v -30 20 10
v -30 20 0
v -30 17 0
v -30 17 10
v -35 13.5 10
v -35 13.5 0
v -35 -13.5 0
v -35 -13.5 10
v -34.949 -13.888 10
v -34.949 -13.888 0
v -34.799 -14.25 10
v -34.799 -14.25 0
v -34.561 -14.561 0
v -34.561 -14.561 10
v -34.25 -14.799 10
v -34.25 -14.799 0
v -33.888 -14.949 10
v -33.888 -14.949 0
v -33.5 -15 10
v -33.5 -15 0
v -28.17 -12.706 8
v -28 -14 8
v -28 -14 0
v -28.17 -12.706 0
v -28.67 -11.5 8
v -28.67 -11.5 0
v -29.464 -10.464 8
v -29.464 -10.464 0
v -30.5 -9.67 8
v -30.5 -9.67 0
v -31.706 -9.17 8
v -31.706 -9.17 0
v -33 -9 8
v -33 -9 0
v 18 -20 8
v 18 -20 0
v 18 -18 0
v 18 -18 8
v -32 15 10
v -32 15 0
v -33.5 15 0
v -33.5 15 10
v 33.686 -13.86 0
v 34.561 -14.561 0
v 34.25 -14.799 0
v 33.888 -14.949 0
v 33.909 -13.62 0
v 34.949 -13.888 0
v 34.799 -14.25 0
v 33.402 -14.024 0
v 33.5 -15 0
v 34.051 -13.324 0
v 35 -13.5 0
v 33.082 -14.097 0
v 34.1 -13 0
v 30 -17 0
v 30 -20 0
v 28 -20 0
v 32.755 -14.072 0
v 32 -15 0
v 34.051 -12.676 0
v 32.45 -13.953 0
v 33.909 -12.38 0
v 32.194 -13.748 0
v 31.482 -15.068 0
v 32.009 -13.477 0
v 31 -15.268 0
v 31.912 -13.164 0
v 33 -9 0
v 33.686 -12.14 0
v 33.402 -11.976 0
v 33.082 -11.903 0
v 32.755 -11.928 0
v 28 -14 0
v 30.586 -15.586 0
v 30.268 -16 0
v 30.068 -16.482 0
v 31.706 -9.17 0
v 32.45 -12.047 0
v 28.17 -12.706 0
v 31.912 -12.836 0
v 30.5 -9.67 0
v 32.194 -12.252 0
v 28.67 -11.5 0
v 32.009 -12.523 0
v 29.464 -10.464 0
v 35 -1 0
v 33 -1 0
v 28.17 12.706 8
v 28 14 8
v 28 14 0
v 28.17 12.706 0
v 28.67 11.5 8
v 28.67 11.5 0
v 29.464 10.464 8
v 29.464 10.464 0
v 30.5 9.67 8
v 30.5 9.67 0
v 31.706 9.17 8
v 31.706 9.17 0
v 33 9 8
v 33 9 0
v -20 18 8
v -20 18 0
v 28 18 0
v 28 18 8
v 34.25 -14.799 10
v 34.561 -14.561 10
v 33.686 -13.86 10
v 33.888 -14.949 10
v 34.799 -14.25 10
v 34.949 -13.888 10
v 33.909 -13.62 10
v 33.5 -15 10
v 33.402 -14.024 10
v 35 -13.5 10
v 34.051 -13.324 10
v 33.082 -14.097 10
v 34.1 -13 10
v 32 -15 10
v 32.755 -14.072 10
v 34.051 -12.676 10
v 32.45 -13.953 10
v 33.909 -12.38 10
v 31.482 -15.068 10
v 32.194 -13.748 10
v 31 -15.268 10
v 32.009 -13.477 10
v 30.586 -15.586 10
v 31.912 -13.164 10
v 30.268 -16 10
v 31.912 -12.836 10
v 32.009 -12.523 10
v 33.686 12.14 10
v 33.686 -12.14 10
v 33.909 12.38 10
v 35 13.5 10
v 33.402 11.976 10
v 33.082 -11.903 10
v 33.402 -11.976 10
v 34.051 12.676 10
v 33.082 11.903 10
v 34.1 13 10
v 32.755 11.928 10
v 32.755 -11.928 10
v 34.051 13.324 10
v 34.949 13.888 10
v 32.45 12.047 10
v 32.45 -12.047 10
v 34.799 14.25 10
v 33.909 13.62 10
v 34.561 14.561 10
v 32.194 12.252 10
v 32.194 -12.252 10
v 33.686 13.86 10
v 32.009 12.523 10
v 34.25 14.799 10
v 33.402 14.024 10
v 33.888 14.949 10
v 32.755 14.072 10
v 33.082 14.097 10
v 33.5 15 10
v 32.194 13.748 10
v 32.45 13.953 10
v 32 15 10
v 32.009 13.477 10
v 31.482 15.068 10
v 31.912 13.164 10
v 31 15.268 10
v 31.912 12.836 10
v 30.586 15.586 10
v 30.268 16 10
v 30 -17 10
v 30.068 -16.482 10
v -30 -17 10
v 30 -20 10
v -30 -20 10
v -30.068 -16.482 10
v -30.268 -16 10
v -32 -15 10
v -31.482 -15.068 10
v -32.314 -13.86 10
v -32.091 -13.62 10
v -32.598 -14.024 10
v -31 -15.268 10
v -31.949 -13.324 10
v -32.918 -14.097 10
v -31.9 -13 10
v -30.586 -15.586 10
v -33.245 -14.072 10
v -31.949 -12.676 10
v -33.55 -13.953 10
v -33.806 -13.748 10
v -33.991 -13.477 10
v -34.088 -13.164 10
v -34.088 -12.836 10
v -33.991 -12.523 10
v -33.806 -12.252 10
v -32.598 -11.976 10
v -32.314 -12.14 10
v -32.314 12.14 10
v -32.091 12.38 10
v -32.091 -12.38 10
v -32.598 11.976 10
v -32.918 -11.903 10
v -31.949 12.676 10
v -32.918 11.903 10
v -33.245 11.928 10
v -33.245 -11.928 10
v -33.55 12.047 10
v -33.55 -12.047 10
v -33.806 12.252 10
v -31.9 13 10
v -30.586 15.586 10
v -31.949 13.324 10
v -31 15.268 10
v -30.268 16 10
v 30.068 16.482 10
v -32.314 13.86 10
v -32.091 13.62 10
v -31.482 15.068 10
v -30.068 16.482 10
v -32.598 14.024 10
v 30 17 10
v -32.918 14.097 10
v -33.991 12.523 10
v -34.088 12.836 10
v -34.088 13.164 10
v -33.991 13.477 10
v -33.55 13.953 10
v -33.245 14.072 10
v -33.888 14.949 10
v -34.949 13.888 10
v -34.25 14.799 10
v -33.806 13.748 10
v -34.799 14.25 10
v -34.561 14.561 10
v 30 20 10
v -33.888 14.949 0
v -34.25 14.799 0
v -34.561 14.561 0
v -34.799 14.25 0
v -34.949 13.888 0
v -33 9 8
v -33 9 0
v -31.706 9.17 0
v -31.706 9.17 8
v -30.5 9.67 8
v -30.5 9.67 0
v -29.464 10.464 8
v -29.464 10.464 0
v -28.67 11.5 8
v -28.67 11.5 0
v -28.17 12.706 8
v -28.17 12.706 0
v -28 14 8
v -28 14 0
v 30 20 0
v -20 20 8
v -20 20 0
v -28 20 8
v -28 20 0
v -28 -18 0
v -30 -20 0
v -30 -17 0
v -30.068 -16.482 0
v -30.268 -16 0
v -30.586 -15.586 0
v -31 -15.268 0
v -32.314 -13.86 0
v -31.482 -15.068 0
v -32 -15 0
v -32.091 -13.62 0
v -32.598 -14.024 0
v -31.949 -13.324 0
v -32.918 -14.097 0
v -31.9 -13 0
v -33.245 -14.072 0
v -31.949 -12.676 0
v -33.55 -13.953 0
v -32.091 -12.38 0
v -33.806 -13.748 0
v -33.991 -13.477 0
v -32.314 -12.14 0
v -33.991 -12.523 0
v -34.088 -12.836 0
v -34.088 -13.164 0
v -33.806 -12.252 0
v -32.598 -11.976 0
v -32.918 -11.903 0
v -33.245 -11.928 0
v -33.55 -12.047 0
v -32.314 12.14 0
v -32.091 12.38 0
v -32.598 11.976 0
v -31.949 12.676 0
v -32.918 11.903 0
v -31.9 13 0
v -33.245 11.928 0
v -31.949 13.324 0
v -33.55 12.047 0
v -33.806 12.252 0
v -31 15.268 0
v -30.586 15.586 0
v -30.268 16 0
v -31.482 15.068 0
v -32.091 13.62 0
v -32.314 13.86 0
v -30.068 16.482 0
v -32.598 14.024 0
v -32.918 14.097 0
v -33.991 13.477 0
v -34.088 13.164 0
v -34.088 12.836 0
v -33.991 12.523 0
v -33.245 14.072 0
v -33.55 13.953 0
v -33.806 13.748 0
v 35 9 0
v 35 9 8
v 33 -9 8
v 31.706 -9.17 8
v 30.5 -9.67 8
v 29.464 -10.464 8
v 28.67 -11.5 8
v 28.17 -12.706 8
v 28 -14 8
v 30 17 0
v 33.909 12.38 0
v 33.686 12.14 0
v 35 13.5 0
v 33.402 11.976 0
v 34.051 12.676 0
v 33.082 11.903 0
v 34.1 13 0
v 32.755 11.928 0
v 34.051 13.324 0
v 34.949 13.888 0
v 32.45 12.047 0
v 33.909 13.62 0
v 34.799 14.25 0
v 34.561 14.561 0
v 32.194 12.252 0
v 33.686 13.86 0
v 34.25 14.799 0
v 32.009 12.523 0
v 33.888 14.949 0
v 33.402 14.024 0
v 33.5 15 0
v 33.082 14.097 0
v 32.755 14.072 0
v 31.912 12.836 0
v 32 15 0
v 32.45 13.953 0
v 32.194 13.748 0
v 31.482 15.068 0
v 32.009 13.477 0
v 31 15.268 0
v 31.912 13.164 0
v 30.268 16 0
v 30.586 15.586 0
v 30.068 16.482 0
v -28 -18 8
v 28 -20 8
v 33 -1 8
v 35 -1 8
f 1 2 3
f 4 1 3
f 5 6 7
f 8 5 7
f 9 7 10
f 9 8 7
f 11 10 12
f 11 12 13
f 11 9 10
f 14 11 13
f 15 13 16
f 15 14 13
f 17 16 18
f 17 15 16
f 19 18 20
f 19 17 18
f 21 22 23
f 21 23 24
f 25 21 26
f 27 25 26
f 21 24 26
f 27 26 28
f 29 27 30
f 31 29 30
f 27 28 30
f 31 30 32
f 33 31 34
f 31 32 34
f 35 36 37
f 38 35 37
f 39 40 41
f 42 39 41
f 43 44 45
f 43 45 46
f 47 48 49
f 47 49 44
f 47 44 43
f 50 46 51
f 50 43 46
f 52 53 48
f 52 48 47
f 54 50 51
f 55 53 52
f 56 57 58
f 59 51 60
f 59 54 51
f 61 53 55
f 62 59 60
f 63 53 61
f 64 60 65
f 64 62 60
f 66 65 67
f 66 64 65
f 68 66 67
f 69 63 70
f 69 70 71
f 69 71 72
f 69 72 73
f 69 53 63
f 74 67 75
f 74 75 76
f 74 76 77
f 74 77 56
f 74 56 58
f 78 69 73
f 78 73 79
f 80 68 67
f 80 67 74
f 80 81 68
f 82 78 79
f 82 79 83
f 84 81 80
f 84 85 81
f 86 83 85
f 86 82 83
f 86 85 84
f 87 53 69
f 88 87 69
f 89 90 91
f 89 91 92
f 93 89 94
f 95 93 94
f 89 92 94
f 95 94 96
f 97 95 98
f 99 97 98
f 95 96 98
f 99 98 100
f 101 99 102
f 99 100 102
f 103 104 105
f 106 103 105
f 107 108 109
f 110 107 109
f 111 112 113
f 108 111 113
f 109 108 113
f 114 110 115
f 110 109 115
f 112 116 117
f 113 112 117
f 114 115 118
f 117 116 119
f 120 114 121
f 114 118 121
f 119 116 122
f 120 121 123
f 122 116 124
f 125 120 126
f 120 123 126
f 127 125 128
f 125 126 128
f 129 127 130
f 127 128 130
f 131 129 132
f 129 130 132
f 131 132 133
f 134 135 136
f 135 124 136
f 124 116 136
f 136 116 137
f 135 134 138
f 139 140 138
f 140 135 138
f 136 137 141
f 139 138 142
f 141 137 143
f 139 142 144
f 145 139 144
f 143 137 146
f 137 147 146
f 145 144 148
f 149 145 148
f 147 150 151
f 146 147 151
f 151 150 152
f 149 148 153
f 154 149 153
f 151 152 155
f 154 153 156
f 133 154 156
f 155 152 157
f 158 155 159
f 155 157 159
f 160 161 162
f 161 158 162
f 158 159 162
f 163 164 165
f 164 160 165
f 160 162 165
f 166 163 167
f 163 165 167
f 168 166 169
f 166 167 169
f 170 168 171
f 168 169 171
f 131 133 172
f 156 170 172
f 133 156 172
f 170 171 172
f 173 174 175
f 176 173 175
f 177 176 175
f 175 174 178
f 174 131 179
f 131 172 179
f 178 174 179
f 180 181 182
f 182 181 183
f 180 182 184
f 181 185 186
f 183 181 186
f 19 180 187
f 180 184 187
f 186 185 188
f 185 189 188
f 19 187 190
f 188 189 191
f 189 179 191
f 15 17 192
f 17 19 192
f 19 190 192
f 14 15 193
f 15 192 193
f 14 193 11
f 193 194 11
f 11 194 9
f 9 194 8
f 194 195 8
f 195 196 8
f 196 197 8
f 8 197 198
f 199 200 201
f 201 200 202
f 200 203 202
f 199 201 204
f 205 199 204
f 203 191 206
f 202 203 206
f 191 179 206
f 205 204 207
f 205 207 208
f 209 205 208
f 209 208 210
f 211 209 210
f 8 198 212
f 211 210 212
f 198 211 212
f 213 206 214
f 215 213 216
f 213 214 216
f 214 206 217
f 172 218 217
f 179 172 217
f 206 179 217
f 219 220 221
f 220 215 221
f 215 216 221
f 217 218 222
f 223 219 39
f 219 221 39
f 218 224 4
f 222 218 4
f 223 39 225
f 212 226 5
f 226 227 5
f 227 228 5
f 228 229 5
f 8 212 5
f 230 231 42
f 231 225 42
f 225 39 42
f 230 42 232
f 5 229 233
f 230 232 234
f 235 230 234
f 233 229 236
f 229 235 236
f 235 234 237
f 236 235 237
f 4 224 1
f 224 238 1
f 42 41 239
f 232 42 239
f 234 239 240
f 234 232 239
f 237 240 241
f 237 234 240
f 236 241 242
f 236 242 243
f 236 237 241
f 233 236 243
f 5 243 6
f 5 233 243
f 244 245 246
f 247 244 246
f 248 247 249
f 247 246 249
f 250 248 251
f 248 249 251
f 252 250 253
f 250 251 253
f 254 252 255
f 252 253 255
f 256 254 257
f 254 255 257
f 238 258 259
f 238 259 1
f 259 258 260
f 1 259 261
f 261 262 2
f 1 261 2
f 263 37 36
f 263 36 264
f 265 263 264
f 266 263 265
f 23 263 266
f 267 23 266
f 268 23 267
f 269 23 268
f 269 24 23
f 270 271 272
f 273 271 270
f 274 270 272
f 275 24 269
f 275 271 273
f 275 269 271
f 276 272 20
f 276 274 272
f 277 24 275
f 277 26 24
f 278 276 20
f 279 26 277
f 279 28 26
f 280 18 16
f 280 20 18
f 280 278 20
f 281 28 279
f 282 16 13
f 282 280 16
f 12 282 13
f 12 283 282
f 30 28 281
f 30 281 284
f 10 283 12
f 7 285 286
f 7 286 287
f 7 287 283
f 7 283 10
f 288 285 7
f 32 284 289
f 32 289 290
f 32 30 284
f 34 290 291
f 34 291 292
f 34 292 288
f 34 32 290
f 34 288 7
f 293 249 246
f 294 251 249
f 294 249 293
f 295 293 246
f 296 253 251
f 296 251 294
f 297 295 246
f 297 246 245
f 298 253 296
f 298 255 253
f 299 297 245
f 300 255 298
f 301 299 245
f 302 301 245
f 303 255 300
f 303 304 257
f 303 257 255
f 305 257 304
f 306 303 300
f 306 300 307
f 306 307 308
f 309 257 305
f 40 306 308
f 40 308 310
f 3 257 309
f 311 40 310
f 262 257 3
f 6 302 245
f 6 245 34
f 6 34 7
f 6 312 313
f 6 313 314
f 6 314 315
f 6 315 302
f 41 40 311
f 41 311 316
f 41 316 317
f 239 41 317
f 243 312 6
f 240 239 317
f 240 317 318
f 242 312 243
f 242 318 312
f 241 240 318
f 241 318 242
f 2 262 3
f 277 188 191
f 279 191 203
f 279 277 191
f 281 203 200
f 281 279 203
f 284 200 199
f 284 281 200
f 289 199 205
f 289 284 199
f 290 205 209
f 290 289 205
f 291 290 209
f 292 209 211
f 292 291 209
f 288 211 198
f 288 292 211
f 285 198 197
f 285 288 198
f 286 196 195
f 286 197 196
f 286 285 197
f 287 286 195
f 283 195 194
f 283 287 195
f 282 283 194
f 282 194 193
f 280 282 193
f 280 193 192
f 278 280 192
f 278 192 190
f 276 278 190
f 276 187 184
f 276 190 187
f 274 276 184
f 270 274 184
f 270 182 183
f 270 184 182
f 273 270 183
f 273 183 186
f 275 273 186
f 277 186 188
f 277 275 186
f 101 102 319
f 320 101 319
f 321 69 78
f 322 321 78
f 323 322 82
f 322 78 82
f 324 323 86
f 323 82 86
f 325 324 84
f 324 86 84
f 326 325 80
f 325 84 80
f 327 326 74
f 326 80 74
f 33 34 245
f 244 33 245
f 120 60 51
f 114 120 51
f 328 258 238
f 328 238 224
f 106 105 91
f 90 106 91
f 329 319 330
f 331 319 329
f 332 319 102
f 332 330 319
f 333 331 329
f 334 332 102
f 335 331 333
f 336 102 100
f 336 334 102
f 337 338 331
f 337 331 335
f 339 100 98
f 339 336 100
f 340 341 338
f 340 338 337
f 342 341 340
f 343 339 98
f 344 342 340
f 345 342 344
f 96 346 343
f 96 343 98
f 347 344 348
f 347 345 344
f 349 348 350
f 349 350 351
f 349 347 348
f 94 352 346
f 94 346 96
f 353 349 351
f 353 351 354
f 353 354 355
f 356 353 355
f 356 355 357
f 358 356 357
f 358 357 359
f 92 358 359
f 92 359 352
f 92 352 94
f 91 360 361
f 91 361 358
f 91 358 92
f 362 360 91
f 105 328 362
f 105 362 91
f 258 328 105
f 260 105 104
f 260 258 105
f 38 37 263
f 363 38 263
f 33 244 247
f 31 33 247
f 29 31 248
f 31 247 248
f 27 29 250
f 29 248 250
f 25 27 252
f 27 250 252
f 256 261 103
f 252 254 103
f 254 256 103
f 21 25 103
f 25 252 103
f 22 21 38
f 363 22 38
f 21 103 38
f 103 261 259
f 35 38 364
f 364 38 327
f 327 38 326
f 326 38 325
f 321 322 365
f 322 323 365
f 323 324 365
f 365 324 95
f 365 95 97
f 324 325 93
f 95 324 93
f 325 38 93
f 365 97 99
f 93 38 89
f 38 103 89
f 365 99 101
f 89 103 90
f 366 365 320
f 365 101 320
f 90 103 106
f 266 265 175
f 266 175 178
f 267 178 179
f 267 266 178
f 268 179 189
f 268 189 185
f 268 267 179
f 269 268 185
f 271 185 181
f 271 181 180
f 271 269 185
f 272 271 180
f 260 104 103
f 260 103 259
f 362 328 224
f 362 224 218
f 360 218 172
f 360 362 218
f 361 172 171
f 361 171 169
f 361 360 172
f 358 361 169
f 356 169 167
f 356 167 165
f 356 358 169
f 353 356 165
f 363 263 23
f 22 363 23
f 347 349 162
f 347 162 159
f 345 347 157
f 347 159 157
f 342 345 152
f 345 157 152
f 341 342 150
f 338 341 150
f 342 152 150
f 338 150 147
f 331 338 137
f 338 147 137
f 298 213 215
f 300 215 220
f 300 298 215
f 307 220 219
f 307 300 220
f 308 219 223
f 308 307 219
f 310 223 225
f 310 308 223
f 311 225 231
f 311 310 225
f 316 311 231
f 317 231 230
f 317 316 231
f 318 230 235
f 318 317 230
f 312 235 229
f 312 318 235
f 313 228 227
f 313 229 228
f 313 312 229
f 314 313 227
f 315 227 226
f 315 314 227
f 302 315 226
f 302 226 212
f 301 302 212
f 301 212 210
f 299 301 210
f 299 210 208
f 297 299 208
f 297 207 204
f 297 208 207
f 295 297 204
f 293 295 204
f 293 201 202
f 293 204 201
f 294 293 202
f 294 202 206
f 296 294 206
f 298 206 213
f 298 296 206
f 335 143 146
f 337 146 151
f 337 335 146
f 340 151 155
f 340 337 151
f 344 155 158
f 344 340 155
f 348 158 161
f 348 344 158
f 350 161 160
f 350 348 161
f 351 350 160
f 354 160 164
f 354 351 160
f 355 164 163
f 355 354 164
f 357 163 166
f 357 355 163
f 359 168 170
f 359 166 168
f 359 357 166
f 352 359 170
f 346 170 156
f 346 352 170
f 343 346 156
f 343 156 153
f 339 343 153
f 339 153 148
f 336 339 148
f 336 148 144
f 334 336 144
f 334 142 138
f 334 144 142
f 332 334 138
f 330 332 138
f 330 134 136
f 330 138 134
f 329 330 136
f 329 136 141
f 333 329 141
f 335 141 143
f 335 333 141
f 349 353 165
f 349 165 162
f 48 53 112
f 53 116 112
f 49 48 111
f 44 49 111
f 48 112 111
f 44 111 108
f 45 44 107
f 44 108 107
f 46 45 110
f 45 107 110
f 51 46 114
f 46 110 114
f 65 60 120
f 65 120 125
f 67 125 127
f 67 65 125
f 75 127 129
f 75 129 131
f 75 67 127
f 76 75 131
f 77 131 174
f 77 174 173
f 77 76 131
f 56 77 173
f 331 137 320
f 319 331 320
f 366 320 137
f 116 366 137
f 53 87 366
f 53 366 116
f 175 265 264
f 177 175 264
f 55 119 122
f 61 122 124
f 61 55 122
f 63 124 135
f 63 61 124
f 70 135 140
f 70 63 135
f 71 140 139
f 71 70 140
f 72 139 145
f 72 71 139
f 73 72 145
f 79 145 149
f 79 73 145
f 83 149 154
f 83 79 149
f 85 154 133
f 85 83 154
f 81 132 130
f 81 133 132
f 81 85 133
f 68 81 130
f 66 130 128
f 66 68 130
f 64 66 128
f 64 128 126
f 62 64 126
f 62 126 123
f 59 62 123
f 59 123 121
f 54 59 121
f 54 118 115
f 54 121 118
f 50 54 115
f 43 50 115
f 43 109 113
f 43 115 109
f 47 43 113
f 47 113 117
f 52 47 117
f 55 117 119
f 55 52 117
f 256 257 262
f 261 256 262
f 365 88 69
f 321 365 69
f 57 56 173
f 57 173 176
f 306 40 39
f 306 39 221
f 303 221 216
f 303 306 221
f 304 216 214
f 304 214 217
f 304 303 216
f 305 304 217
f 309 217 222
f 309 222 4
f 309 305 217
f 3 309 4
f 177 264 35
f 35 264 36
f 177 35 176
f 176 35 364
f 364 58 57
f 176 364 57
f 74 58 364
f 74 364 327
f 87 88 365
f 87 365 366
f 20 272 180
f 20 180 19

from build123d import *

# Parameters (mm, degrees)
PAD_DEPTH       = 10
SKETCH002_R     = 1.1
HOLE_DEPTH      = 25
POCKET001_DEPTH = 8
SKETCH004_W     = 8
SKETCH004_H     = 4
SKETCH004_W_2   = 10
SKETCH004_W_3   = 4
SKETCH004_H_2   = 10
POCKET002_DEPTH = 8
FILLET_R        = 1.5


with BuildPart() as part:
    # Sketch → Pad (new body)
    with BuildSketch(Plane.XY):
        with BuildLine():
            ThreePointArc((-30, -17), (-30.585786, -15.585786), (-32, -15))
            Line((-32, -15), (-35, -15))
            Line((-35, 15), (-35, -15))
            Line((-32, 15), (-35, 15))
            ThreePointArc((-32, 15), (-30.585786, 15.585786), (-30, 17))
            Line((-30, 20), (-30, 17))
            Line((30, 20), (-30, 20))
            Line((30, 20), (30, 17))
            ThreePointArc((30, 17), (30.585786, 15.585786), (32, 15))
            Line((32, 15), (35, 15))
            Line((35, 15), (35, -15))
            Line((32, -15), (35, -15))
            ThreePointArc((32, -15), (30.585786, -15.585786), (30, -17))
            Line((30, -17), (30, -20))
            Line((-30, -20), (30, -20))
            Line((-30, -17), (-30, -20))
        make_face()
    extrude(amount=PAD_DEPTH)

    # Sketch002 → Hole (cut)
    with BuildSketch(Plane.XY):
        with Locations((33, 13)):
            Circle(SKETCH002_R)
        with Locations((33, -13)):
            Circle(SKETCH002_R)
        with Locations((-33, -13)):
            Circle(SKETCH002_R)
        with Locations((-33, 13)):
            Circle(SKETCH002_R)
    extrude(amount=HOLE_DEPTH, mode=Mode.SUBTRACT)

    # Sketch003 → Pocket001 (cut)
    with BuildSketch(Plane.XY):
        with BuildLine():
            Line((28, -18), (-28, -18))
            Line((-28, -18), (-28, -14))
            ThreePointArc((-28, -14), (-29.464466, -10.464466), (-33, -9))
            Line((-33, -9), (-33, 9))
            ThreePointArc((-33, 9), (-29.464466, 10.464466), (-28, 14))
            Line((-28, 14), (-28, 18))
            Line((-28, 18), (28, 18))
            Line((28, 18), (28, 14))
            ThreePointArc((28, 14), (29.464466, 10.464466), (33, 9))
            Line((33, 9), (33, -9))
            ThreePointArc((33, -9), (29.464466, -10.464466), (28, -14))
            Line((28, -14), (28, -18))
        make_face()
    extrude(amount=POCKET001_DEPTH, mode=Mode.SUBTRACT)

    # Sketch004 → Pocket002 (cut)
    with BuildSketch(Plane.XY):
        with Locations((-24, 19)):
            Rectangle(SKETCH004_W, SKETCH004_H)
        with Locations((23, -19)):
            Rectangle(SKETCH004_W_2, SKETCH004_H)
        with Locations((34, 4)):
            Rectangle(SKETCH004_W_3, SKETCH004_H_2)
    extrude(amount=POCKET002_DEPTH, mode=Mode.SUBTRACT)

    # Fillet
    fillet_edges = [part.edges().sort_by_distance(p)[0] for p in [
        (35, -15, 5),
        (35, 15, 5),
        (-35, -15, 5),
        (-35, 15, 5),
    ]]
    fillet(fillet_edges, radius=FILLET_R)


solid = part.part
